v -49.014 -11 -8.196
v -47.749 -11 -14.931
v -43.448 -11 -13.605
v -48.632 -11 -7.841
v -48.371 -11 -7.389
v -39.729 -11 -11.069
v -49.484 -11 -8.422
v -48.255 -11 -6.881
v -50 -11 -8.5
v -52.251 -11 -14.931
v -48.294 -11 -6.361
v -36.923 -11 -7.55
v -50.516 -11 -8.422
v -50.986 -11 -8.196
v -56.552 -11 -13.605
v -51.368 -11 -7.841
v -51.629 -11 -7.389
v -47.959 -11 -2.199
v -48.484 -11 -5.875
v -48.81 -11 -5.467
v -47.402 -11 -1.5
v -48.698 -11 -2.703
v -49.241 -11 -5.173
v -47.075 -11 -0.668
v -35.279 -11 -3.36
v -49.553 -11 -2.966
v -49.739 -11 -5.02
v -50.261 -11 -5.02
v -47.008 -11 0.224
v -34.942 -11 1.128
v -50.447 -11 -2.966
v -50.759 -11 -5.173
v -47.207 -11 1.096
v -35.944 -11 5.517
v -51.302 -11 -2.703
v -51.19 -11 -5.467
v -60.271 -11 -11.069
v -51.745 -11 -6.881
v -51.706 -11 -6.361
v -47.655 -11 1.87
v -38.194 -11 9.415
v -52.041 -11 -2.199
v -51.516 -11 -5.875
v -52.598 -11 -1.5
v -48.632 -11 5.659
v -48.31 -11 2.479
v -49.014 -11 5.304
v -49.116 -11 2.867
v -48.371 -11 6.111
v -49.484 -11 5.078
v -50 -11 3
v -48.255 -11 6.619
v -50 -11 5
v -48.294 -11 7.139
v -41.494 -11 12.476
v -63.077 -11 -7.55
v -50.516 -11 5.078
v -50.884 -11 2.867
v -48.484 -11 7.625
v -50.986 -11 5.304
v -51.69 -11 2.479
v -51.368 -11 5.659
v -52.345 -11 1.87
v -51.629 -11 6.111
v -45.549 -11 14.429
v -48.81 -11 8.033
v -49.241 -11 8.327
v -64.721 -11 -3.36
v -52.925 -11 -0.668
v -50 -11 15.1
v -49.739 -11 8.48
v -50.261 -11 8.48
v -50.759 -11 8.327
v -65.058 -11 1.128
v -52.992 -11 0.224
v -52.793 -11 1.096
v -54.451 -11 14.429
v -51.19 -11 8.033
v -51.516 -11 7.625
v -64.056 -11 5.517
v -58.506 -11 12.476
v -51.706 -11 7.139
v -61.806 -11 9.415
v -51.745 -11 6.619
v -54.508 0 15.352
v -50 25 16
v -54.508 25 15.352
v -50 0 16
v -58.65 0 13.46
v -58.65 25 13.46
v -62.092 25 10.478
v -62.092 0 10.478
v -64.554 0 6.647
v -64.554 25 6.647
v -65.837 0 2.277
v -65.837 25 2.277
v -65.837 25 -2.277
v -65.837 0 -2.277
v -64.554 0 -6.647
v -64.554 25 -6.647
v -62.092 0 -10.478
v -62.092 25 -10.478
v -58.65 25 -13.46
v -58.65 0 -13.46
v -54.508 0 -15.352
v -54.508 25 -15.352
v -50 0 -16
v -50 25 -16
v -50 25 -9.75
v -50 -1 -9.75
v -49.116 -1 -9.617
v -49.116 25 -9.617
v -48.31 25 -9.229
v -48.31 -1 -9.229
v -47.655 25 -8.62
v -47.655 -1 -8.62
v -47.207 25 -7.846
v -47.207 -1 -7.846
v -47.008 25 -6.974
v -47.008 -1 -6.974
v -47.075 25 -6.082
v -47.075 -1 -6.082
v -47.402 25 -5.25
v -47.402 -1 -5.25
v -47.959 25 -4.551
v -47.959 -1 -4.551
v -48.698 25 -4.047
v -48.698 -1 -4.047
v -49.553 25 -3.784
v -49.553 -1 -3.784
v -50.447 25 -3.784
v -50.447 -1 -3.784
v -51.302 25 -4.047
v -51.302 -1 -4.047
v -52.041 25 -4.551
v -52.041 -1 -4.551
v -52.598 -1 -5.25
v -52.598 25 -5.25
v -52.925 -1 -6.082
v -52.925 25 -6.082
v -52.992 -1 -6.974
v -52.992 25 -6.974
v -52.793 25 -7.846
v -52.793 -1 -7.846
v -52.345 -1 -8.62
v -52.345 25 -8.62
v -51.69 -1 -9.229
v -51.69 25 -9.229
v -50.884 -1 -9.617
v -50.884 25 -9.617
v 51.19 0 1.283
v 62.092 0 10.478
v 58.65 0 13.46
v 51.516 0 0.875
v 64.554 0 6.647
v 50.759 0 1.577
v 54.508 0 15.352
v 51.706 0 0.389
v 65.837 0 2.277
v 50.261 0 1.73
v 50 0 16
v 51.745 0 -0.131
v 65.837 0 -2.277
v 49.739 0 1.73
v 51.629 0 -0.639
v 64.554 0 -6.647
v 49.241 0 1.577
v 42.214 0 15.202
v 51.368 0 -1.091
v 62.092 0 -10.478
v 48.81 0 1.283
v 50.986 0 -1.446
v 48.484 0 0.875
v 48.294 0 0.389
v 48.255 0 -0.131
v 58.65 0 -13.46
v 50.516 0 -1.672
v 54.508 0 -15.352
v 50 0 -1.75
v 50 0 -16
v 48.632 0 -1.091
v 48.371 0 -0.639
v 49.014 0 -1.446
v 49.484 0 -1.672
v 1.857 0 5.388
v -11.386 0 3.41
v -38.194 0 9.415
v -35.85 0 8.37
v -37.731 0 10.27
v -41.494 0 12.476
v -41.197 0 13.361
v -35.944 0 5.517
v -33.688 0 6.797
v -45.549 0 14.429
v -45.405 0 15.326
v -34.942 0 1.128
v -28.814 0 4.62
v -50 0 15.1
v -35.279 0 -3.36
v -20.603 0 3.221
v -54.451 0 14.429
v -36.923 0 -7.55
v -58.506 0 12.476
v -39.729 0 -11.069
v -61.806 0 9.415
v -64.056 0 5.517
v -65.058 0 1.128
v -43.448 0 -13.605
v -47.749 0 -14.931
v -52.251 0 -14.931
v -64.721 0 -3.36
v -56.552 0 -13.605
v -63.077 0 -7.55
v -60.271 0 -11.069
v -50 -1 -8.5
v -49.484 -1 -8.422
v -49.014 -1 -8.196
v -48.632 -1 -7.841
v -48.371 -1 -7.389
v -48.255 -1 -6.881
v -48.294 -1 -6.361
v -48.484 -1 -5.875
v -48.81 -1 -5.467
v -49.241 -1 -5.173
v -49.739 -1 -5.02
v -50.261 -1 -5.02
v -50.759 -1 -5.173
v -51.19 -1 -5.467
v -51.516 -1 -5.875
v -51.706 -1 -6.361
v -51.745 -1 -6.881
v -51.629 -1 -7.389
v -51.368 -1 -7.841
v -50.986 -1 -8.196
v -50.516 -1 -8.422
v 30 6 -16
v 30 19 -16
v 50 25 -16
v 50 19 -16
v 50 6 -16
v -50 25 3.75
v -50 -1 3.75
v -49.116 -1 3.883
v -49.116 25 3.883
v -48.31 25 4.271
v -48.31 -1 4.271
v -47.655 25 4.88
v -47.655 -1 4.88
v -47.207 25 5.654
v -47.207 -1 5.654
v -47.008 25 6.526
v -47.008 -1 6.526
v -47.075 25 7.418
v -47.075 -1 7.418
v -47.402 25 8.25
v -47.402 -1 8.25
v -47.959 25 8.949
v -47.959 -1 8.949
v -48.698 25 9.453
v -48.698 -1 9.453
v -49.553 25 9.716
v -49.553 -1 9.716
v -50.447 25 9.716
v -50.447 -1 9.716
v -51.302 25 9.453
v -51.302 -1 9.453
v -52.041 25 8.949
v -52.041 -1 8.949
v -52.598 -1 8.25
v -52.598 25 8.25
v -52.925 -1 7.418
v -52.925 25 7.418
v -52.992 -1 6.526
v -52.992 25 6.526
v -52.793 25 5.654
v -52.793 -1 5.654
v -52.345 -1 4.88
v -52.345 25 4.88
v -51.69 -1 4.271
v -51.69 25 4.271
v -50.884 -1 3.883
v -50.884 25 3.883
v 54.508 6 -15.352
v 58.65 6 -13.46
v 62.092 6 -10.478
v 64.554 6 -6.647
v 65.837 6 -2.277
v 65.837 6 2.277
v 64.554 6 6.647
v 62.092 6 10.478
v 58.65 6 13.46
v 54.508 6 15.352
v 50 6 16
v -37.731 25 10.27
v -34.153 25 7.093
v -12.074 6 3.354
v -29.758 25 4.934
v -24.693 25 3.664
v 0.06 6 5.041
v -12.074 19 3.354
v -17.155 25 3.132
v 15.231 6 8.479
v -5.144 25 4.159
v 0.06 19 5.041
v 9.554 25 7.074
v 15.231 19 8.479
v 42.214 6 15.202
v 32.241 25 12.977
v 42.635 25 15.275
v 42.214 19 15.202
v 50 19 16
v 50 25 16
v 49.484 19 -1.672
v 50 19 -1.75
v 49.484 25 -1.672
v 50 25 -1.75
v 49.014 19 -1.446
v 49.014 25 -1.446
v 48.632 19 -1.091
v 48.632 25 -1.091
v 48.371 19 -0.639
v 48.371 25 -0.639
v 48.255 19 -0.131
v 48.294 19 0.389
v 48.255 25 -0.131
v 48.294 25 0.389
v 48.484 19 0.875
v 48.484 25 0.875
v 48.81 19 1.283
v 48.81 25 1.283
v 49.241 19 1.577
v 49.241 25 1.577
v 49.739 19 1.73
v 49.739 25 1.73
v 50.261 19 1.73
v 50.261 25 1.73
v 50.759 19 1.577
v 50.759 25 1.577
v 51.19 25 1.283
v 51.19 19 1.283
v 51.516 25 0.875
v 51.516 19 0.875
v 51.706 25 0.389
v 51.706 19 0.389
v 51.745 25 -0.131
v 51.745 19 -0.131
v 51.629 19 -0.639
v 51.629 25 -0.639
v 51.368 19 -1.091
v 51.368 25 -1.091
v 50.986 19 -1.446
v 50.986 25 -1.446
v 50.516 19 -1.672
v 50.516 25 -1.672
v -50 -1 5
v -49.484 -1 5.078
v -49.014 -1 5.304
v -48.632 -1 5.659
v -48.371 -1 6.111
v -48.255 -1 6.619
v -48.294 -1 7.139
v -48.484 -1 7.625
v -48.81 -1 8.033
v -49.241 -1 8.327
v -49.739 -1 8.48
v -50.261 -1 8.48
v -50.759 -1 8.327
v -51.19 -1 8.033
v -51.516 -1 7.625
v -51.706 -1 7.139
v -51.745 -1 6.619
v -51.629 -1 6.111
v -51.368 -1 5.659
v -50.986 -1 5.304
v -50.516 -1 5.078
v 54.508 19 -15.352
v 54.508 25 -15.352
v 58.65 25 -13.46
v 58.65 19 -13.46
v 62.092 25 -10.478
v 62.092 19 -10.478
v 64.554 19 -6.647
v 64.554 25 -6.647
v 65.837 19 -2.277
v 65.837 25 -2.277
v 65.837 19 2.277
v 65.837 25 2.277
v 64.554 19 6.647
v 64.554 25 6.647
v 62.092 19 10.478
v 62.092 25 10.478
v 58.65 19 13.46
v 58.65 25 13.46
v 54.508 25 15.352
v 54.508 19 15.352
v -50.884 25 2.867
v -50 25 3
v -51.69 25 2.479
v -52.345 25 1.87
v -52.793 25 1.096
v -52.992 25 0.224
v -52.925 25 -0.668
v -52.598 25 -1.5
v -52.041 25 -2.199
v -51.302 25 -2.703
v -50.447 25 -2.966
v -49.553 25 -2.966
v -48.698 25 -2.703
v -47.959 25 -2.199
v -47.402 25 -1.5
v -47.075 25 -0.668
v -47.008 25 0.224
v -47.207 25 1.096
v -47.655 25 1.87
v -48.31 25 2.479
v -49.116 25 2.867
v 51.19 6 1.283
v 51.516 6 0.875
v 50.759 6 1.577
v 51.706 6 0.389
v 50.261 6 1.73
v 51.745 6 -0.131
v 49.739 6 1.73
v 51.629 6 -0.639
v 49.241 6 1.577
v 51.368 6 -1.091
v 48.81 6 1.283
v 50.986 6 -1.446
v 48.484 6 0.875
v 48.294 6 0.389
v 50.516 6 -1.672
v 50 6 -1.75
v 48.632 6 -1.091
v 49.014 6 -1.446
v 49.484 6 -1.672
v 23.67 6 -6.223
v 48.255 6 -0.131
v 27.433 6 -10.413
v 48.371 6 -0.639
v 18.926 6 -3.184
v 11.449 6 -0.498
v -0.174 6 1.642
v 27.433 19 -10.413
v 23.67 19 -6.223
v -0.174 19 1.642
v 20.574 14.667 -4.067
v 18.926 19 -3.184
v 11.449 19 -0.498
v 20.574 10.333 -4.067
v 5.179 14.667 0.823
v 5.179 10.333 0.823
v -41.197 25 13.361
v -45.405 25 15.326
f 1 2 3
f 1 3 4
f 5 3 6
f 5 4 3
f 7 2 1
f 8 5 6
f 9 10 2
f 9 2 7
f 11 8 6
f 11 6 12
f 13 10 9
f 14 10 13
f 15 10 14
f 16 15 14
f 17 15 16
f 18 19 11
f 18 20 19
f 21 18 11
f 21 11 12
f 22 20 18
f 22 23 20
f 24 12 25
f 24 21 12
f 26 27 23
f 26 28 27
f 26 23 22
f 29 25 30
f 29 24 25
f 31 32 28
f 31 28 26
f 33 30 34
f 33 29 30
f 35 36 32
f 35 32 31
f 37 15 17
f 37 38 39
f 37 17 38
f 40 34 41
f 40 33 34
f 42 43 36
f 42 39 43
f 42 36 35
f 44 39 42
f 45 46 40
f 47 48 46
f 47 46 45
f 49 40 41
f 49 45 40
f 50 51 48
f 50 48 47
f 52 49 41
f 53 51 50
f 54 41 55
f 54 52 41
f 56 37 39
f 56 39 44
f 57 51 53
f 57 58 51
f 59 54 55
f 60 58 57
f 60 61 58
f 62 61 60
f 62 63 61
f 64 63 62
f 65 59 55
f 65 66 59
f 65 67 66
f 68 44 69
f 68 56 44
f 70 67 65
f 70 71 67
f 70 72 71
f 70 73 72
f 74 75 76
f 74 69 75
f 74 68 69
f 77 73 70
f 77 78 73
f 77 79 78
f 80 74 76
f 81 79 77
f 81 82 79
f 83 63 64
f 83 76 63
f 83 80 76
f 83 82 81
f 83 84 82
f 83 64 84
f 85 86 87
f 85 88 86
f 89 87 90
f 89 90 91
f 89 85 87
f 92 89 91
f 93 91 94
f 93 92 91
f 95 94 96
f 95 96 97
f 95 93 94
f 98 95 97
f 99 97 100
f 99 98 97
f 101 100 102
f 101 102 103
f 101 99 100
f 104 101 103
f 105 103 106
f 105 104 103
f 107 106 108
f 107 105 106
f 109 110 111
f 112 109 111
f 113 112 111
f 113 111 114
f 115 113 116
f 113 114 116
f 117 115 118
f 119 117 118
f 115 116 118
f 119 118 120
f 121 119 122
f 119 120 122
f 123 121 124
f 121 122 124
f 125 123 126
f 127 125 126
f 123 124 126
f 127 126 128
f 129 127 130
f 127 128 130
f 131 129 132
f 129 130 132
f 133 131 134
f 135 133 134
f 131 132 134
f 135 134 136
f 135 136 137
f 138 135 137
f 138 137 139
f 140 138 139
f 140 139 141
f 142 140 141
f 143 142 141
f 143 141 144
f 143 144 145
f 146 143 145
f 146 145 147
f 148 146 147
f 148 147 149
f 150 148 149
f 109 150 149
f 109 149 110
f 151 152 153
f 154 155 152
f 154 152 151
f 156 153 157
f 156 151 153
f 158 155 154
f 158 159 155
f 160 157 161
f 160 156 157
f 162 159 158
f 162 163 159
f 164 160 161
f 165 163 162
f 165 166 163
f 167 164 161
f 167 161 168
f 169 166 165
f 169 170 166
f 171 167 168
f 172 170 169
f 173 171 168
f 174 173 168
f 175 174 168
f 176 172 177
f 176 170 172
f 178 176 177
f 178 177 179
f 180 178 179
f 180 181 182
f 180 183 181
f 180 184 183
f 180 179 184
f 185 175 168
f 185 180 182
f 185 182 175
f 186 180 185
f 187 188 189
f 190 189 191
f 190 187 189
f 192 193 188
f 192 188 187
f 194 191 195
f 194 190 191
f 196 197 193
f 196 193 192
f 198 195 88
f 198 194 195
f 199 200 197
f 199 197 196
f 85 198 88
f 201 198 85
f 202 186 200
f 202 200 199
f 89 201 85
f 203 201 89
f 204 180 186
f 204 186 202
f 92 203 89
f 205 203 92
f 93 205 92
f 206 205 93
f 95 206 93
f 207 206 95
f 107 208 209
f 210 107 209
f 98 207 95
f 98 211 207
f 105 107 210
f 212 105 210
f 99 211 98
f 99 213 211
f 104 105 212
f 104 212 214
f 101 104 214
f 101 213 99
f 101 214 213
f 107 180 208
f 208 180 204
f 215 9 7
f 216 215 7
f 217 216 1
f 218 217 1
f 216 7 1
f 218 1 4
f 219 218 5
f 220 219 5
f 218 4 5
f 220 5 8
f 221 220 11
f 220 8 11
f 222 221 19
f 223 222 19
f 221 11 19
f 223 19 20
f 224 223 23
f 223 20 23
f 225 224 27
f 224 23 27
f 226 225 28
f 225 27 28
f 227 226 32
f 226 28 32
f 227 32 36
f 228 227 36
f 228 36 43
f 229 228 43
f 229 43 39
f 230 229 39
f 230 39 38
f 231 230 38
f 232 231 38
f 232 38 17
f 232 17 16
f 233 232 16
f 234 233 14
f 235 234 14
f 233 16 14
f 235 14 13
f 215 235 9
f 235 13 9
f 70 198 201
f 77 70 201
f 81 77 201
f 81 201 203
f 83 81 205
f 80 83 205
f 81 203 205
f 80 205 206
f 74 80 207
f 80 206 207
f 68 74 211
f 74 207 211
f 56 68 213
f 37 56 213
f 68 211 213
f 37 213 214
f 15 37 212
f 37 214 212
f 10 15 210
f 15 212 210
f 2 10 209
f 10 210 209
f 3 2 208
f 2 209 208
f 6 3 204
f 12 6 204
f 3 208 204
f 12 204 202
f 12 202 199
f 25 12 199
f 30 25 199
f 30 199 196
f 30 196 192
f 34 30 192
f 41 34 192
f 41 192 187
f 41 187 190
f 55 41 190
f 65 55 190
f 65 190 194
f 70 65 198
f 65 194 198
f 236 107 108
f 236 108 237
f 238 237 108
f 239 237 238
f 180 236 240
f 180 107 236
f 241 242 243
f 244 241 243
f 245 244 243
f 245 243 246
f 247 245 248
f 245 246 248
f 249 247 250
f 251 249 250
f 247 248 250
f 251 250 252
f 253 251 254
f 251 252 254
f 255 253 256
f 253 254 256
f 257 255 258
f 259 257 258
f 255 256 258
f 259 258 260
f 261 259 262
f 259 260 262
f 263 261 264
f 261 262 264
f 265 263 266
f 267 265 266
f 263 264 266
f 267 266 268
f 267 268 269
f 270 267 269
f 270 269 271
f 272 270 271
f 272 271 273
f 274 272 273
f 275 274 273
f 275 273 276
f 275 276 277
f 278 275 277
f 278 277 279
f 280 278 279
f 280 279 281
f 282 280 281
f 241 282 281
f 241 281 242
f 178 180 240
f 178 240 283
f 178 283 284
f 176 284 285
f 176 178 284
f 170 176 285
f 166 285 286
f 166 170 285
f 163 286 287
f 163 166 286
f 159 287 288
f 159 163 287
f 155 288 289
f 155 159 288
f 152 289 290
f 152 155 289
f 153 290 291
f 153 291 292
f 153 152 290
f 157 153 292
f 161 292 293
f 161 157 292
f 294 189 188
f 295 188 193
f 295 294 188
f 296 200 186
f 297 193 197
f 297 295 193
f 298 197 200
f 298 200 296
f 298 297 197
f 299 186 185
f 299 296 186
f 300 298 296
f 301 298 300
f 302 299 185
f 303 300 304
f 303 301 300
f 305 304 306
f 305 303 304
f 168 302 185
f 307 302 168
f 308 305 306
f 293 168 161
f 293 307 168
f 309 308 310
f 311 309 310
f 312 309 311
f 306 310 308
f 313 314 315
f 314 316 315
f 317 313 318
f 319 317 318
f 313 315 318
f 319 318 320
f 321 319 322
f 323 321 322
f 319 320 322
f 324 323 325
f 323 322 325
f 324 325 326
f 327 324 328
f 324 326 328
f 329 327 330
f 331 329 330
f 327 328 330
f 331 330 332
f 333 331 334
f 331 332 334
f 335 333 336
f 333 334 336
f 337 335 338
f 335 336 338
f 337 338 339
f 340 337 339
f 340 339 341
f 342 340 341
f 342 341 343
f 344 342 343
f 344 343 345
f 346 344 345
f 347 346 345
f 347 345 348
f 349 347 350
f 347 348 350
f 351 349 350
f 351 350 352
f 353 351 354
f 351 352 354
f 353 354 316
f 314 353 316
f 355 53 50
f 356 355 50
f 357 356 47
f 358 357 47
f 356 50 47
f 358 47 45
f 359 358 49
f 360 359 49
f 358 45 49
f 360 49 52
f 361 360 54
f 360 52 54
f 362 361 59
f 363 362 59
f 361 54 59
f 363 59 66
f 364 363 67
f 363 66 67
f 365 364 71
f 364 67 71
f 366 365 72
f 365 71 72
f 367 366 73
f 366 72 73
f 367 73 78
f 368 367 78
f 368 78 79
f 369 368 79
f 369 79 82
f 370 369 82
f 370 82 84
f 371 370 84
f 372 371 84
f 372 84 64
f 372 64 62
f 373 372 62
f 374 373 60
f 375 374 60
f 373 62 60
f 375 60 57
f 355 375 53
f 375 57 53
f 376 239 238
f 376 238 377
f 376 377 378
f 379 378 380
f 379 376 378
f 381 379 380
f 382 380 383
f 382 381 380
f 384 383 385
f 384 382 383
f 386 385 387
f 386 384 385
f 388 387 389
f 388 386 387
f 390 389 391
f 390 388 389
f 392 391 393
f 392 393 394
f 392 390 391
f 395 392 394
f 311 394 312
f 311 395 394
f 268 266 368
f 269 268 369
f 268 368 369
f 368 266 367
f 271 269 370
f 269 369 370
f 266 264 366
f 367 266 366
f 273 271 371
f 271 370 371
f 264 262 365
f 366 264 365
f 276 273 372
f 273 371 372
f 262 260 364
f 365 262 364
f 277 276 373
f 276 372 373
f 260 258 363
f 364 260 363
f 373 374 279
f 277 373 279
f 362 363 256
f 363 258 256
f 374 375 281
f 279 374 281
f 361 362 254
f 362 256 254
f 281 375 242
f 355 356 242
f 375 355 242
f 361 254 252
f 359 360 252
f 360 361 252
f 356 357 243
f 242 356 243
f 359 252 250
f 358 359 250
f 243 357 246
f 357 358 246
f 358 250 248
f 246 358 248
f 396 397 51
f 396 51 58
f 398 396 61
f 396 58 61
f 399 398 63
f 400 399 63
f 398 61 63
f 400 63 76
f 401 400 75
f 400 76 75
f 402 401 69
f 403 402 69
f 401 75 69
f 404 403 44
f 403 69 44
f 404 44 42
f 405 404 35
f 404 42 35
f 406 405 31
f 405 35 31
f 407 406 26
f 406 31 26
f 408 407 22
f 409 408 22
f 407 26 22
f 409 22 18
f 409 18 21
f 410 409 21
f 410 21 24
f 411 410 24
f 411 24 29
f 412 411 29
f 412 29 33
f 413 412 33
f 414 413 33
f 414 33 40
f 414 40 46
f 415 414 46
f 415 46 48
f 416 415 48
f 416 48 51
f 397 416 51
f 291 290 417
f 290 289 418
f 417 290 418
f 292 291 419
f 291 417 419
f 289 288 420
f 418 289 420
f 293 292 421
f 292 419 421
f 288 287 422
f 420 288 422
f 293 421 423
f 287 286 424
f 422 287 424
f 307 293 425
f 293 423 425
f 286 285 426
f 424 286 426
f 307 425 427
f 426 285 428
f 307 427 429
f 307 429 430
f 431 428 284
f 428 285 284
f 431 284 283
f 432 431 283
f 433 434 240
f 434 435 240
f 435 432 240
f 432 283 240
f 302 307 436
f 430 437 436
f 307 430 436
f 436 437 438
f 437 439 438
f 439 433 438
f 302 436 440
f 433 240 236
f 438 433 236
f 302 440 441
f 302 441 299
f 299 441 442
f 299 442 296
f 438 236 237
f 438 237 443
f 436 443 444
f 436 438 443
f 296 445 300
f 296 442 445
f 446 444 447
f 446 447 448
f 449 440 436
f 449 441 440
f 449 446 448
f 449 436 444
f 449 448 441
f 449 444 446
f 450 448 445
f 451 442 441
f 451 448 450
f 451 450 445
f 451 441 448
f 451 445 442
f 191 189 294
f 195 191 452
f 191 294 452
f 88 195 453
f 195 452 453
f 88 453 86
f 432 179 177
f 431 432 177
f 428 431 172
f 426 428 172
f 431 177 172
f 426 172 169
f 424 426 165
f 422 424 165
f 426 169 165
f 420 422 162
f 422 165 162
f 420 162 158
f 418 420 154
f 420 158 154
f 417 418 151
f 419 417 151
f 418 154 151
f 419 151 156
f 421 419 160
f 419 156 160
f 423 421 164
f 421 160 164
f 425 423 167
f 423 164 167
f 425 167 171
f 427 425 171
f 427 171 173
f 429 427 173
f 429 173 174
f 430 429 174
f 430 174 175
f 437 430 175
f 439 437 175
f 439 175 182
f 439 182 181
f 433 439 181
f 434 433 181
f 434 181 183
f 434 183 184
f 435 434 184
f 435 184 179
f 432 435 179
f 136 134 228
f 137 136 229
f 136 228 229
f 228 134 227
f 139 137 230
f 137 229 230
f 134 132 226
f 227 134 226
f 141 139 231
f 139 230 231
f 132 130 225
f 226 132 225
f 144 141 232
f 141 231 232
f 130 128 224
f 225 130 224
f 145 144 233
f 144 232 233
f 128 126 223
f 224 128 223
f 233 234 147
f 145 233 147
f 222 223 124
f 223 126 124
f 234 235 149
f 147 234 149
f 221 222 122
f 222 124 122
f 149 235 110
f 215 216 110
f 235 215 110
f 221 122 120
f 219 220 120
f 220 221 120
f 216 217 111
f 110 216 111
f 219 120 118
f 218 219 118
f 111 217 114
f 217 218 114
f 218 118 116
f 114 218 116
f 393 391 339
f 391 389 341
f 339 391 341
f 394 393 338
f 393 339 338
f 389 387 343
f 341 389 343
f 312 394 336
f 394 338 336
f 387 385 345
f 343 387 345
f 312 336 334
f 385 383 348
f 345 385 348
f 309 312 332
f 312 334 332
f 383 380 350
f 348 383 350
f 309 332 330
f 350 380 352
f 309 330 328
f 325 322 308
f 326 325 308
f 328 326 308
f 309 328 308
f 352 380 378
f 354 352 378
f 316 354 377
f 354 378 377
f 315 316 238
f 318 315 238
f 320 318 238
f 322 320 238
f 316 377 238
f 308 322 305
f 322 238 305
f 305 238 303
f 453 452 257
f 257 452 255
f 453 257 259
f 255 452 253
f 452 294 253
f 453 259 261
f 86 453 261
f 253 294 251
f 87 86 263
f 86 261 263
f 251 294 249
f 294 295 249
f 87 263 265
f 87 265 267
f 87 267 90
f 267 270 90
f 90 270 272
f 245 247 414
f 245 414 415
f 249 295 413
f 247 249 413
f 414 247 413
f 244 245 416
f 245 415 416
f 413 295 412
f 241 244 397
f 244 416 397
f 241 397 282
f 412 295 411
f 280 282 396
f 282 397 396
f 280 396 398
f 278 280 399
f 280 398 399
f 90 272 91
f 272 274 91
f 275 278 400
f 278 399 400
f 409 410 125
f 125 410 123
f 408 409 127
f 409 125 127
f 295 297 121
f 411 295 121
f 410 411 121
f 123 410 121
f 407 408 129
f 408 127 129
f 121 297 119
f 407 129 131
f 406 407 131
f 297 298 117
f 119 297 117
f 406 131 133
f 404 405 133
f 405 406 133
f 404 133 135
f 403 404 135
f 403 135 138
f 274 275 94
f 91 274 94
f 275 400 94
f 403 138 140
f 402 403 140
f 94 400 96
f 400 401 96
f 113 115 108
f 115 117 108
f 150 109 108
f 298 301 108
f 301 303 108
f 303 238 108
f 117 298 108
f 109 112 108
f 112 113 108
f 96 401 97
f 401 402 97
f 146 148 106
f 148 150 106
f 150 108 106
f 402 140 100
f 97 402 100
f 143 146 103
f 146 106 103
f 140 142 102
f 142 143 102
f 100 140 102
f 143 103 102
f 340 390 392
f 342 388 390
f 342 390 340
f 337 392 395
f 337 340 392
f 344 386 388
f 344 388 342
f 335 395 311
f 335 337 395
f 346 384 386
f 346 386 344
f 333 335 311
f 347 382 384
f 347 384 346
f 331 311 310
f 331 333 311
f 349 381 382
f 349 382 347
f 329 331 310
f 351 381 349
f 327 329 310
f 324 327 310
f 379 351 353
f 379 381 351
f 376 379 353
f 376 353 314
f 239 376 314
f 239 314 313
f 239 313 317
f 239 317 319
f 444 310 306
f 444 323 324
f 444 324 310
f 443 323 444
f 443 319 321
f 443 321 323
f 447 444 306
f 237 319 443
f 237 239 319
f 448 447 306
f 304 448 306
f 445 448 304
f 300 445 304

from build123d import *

# Parameters (mm, degrees)
BOSS_EXTRUDE1_DEPTH            = 6
SKETCH3_R                      = 1.75
CUT_EXTRUDE2_DEPTH             = 69.176242196
BOSS_EXTRUDE2_DEPTH            = 13
BOSS_EXTRUDE3_DEPTH            = 6
CUT_EXTRUDE3_REACH             = 74.367
SKETCH6_R                      = 1.75
CUT_EXTRUDE4_REACH             = 74.367
SKETCH8_R                      = 15.1
BOSS_EXTRUDE4_DEPTH            = 11
SKETCH9_R                      = 1.75
CUT_EXTRUDE5_DEPTH             = 10
CUT_EXTRUDE6_REACH             = 78.864
SKETCH11_R                     = 3
CUT_EXTRUDE6_DIRECTION_2_DEPTH = 77.863515556
CUT_EXTRUDE7_REACH             = 74.719
SKETCH12_R                     = 3


with BuildPart() as part:
    # Sketch1 → Boss-Extrude1 (new body)
    with BuildSketch(Plane(origin=(0, 0, 0), x_dir=(1, 0, 0), z_dir=(0, 1, 0))):
        with BuildLine():
            Line((-50, 16), (50, 16))
            ThreePointArc((50, 16), (66, 0), (50, -16))
            Line((50, -16), (-50, -16))
            ThreePointArc((-50, -16), (-66, 0), (-50, 16))
        make_face()
    extrude(amount=BOSS_EXTRUDE1_DEPTH)

    # Sketch3 → Cut-Extrude2 (cut, through all)
    with BuildSketch(Plane.XZ):
        with Locations(Location((50, 0, 0), (0, 0, 270))):
            Circle(SKETCH3_R)
    extrude(amount=-CUT_EXTRUDE2_DEPTH, mode=Mode.SUBTRACT)

    # Sketch4 → Boss-Extrude2 (add)
    with BuildSketch(Plane(origin=(0, 6, 0), x_dir=(1, 0, 0), z_dir=(0, 1, 0))):
        with BuildLine():
            Line((-50, 16), (30, 16))
            add(Edge.make_bspline(
                [(30, 16), (21.992860017, -10.862158013), (-23.676278326, 6.118145935), (-34.285676412, -16)],
                knots=[0, 0, 0, 0, 1, 1, 1, 1], degree=3))
            Line((-34.285676412, -16), (-50, -16))
            ThreePointArc((-50, -16), (-66, 0), (-50, 16))
        make_face()
    extrude(amount=BOSS_EXTRUDE2_DEPTH)

    # Sketch5 → Boss-Extrude3 (add)
    with BuildSketch(Plane(origin=(0, 19, 0), x_dir=(1, 0, 0), z_dir=(0, 1, 0))):
        with BuildLine():
            Line((-50, 16), (50, 16))
            ThreePointArc((50, 16), (66, 0), (50, -16))
            Line((50, -16), (-50, -16))
            ThreePointArc((-50, -16), (-66, 0), (-50, 16))
        make_face()
    extrude(amount=BOSS_EXTRUDE3_DEPTH)

    # Sketch6 → Cut-Extrude3 (cut, up to next)
    with BuildSketch(Plane(origin=(0, 25, 0), x_dir=(1, 0, 0), z_dir=(0, 1, 0)), mode=Mode.PRIVATE) as cut_extrude3_sk1:
        with Locations(Location((50, 0, 0), (0, 0, 90))):
            Circle(SKETCH6_R)
    cut_extrude3_tool1 = extrude(cut_extrude3_sk1.sketch, amount=-CUT_EXTRUDE3_REACH, mode=Mode.PRIVATE) & part.part
    add(cut_extrude3_tool1.solids().sort_by_distance((50, 25, 0))[0], mode=Mode.SUBTRACT)

    # Sketch7 → Cut-Extrude4 (cut, up to next)
    with BuildSketch(Plane(origin=(0, 25, 0), x_dir=(1, 0, 0), z_dir=(0, 1, 0)), mode=Mode.PRIVATE) as cut_extrude4_sk1:
        with BuildLine():
            ThreePointArc((-37.731263809, -10.270253759), (-43.22962557, -14.496966237), (-50, -16))
            Line((-50, -16), (50, -16))
            add(Edge.make_bspline(
                [(-37.731263809, -10.270253759), (-30.332556703, -1.431836739), (6.050402888, -3.364587973), (38.512231583, -16), (50, -16)],
                knots=[0, 0, 0, 0, 0.426660683, 1, 1, 1, 1], degree=3))
        make_face()
    cut_extrude4_tool1 = extrude(cut_extrude4_sk1.sketch, amount=-CUT_EXTRUDE4_REACH, mode=Mode.PRIVATE) & part.part
    add(cut_extrude4_tool1.solids().sort_by_distance((-6.915299, 25, 11.013102))[0], mode=Mode.SUBTRACT)

    # Sketch8 → Boss-Extrude4 (add)
    with BuildSketch(Plane.XZ):
        with Locations(Location((-50, 0, 0), (0, 0, 90))):
            Circle(SKETCH8_R)
    extrude(amount=BOSS_EXTRUDE4_DEPTH)

    # Sketch9 → Cut-Extrude5 (cut)
    with BuildSketch(Plane.XZ.offset(11)):
        with Locations(Location((-50, 6.75, 0), (0, 0, 270))):
            Circle(SKETCH9_R)
        with Locations(Location((-50, -6.75, 0), (0, 0, 270))):
            Circle(SKETCH9_R)
    extrude(amount=-CUT_EXTRUDE5_DEPTH, mode=Mode.SUBTRACT)

    # Sketch11 → Cut-Extrude6 (cut, up to next)
    with BuildSketch(Plane.XZ.offset(11), mode=Mode.PRIVATE) as cut_extrude6_sk1:
        with Locations(Location((-50, 0, 0), (0, 0, 90))):
            Circle(SKETCH11_R)
    cut_extrude6_tool1 = extrude(cut_extrude6_sk1.sketch, amount=-CUT_EXTRUDE6_REACH, mode=Mode.PRIVATE) & part.part
    add(cut_extrude6_tool1.solids().sort_by_distance((-50, -11, 0))[0], mode=Mode.SUBTRACT)

    # Sketch11 → Cut-Extrude6 direction 2 (cut)
    with BuildSketch(Plane.XZ.offset(11)):
        with Locations(Location((-50, 0, 0), (0, 0, 90))):
            Circle(SKETCH11_R)
    extrude(amount=CUT_EXTRUDE6_DIRECTION_2_DEPTH, mode=Mode.SUBTRACT)

    # Sketch12 → Cut-Extrude7 (cut, up to next)
    with BuildSketch(Plane.XZ.offset(1), mode=Mode.PRIVATE) as cut_extrude7_sk1:
        with Locations(Location((-50, 6.75, 0), (0, 0, 270))):
            Circle(SKETCH12_R)
    cut_extrude7_tool1 = extrude(cut_extrude7_sk1.sketch, amount=-CUT_EXTRUDE7_REACH, mode=Mode.PRIVATE) & part.part
    # Sketch12 → Cut-Extrude7 (cut, up to next)
    with BuildSketch(Plane.XZ.offset(1), mode=Mode.PRIVATE) as cut_extrude7_sk2:
        with Locations(Location((-50, -6.75, 0), (0, 0, 270))):
            Circle(SKETCH12_R)
    cut_extrude7_tool2 = extrude(cut_extrude7_sk2.sketch, amount=-CUT_EXTRUDE7_REACH, mode=Mode.PRIVATE) & part.part
    add(cut_extrude7_tool1.solids().sort_by_distance((-50, -1, 6.75))[0], mode=Mode.SUBTRACT)
    add(cut_extrude7_tool2.solids().sort_by_distance((-50, -1, -6.75))[0], mode=Mode.SUBTRACT)


solid = part.part
